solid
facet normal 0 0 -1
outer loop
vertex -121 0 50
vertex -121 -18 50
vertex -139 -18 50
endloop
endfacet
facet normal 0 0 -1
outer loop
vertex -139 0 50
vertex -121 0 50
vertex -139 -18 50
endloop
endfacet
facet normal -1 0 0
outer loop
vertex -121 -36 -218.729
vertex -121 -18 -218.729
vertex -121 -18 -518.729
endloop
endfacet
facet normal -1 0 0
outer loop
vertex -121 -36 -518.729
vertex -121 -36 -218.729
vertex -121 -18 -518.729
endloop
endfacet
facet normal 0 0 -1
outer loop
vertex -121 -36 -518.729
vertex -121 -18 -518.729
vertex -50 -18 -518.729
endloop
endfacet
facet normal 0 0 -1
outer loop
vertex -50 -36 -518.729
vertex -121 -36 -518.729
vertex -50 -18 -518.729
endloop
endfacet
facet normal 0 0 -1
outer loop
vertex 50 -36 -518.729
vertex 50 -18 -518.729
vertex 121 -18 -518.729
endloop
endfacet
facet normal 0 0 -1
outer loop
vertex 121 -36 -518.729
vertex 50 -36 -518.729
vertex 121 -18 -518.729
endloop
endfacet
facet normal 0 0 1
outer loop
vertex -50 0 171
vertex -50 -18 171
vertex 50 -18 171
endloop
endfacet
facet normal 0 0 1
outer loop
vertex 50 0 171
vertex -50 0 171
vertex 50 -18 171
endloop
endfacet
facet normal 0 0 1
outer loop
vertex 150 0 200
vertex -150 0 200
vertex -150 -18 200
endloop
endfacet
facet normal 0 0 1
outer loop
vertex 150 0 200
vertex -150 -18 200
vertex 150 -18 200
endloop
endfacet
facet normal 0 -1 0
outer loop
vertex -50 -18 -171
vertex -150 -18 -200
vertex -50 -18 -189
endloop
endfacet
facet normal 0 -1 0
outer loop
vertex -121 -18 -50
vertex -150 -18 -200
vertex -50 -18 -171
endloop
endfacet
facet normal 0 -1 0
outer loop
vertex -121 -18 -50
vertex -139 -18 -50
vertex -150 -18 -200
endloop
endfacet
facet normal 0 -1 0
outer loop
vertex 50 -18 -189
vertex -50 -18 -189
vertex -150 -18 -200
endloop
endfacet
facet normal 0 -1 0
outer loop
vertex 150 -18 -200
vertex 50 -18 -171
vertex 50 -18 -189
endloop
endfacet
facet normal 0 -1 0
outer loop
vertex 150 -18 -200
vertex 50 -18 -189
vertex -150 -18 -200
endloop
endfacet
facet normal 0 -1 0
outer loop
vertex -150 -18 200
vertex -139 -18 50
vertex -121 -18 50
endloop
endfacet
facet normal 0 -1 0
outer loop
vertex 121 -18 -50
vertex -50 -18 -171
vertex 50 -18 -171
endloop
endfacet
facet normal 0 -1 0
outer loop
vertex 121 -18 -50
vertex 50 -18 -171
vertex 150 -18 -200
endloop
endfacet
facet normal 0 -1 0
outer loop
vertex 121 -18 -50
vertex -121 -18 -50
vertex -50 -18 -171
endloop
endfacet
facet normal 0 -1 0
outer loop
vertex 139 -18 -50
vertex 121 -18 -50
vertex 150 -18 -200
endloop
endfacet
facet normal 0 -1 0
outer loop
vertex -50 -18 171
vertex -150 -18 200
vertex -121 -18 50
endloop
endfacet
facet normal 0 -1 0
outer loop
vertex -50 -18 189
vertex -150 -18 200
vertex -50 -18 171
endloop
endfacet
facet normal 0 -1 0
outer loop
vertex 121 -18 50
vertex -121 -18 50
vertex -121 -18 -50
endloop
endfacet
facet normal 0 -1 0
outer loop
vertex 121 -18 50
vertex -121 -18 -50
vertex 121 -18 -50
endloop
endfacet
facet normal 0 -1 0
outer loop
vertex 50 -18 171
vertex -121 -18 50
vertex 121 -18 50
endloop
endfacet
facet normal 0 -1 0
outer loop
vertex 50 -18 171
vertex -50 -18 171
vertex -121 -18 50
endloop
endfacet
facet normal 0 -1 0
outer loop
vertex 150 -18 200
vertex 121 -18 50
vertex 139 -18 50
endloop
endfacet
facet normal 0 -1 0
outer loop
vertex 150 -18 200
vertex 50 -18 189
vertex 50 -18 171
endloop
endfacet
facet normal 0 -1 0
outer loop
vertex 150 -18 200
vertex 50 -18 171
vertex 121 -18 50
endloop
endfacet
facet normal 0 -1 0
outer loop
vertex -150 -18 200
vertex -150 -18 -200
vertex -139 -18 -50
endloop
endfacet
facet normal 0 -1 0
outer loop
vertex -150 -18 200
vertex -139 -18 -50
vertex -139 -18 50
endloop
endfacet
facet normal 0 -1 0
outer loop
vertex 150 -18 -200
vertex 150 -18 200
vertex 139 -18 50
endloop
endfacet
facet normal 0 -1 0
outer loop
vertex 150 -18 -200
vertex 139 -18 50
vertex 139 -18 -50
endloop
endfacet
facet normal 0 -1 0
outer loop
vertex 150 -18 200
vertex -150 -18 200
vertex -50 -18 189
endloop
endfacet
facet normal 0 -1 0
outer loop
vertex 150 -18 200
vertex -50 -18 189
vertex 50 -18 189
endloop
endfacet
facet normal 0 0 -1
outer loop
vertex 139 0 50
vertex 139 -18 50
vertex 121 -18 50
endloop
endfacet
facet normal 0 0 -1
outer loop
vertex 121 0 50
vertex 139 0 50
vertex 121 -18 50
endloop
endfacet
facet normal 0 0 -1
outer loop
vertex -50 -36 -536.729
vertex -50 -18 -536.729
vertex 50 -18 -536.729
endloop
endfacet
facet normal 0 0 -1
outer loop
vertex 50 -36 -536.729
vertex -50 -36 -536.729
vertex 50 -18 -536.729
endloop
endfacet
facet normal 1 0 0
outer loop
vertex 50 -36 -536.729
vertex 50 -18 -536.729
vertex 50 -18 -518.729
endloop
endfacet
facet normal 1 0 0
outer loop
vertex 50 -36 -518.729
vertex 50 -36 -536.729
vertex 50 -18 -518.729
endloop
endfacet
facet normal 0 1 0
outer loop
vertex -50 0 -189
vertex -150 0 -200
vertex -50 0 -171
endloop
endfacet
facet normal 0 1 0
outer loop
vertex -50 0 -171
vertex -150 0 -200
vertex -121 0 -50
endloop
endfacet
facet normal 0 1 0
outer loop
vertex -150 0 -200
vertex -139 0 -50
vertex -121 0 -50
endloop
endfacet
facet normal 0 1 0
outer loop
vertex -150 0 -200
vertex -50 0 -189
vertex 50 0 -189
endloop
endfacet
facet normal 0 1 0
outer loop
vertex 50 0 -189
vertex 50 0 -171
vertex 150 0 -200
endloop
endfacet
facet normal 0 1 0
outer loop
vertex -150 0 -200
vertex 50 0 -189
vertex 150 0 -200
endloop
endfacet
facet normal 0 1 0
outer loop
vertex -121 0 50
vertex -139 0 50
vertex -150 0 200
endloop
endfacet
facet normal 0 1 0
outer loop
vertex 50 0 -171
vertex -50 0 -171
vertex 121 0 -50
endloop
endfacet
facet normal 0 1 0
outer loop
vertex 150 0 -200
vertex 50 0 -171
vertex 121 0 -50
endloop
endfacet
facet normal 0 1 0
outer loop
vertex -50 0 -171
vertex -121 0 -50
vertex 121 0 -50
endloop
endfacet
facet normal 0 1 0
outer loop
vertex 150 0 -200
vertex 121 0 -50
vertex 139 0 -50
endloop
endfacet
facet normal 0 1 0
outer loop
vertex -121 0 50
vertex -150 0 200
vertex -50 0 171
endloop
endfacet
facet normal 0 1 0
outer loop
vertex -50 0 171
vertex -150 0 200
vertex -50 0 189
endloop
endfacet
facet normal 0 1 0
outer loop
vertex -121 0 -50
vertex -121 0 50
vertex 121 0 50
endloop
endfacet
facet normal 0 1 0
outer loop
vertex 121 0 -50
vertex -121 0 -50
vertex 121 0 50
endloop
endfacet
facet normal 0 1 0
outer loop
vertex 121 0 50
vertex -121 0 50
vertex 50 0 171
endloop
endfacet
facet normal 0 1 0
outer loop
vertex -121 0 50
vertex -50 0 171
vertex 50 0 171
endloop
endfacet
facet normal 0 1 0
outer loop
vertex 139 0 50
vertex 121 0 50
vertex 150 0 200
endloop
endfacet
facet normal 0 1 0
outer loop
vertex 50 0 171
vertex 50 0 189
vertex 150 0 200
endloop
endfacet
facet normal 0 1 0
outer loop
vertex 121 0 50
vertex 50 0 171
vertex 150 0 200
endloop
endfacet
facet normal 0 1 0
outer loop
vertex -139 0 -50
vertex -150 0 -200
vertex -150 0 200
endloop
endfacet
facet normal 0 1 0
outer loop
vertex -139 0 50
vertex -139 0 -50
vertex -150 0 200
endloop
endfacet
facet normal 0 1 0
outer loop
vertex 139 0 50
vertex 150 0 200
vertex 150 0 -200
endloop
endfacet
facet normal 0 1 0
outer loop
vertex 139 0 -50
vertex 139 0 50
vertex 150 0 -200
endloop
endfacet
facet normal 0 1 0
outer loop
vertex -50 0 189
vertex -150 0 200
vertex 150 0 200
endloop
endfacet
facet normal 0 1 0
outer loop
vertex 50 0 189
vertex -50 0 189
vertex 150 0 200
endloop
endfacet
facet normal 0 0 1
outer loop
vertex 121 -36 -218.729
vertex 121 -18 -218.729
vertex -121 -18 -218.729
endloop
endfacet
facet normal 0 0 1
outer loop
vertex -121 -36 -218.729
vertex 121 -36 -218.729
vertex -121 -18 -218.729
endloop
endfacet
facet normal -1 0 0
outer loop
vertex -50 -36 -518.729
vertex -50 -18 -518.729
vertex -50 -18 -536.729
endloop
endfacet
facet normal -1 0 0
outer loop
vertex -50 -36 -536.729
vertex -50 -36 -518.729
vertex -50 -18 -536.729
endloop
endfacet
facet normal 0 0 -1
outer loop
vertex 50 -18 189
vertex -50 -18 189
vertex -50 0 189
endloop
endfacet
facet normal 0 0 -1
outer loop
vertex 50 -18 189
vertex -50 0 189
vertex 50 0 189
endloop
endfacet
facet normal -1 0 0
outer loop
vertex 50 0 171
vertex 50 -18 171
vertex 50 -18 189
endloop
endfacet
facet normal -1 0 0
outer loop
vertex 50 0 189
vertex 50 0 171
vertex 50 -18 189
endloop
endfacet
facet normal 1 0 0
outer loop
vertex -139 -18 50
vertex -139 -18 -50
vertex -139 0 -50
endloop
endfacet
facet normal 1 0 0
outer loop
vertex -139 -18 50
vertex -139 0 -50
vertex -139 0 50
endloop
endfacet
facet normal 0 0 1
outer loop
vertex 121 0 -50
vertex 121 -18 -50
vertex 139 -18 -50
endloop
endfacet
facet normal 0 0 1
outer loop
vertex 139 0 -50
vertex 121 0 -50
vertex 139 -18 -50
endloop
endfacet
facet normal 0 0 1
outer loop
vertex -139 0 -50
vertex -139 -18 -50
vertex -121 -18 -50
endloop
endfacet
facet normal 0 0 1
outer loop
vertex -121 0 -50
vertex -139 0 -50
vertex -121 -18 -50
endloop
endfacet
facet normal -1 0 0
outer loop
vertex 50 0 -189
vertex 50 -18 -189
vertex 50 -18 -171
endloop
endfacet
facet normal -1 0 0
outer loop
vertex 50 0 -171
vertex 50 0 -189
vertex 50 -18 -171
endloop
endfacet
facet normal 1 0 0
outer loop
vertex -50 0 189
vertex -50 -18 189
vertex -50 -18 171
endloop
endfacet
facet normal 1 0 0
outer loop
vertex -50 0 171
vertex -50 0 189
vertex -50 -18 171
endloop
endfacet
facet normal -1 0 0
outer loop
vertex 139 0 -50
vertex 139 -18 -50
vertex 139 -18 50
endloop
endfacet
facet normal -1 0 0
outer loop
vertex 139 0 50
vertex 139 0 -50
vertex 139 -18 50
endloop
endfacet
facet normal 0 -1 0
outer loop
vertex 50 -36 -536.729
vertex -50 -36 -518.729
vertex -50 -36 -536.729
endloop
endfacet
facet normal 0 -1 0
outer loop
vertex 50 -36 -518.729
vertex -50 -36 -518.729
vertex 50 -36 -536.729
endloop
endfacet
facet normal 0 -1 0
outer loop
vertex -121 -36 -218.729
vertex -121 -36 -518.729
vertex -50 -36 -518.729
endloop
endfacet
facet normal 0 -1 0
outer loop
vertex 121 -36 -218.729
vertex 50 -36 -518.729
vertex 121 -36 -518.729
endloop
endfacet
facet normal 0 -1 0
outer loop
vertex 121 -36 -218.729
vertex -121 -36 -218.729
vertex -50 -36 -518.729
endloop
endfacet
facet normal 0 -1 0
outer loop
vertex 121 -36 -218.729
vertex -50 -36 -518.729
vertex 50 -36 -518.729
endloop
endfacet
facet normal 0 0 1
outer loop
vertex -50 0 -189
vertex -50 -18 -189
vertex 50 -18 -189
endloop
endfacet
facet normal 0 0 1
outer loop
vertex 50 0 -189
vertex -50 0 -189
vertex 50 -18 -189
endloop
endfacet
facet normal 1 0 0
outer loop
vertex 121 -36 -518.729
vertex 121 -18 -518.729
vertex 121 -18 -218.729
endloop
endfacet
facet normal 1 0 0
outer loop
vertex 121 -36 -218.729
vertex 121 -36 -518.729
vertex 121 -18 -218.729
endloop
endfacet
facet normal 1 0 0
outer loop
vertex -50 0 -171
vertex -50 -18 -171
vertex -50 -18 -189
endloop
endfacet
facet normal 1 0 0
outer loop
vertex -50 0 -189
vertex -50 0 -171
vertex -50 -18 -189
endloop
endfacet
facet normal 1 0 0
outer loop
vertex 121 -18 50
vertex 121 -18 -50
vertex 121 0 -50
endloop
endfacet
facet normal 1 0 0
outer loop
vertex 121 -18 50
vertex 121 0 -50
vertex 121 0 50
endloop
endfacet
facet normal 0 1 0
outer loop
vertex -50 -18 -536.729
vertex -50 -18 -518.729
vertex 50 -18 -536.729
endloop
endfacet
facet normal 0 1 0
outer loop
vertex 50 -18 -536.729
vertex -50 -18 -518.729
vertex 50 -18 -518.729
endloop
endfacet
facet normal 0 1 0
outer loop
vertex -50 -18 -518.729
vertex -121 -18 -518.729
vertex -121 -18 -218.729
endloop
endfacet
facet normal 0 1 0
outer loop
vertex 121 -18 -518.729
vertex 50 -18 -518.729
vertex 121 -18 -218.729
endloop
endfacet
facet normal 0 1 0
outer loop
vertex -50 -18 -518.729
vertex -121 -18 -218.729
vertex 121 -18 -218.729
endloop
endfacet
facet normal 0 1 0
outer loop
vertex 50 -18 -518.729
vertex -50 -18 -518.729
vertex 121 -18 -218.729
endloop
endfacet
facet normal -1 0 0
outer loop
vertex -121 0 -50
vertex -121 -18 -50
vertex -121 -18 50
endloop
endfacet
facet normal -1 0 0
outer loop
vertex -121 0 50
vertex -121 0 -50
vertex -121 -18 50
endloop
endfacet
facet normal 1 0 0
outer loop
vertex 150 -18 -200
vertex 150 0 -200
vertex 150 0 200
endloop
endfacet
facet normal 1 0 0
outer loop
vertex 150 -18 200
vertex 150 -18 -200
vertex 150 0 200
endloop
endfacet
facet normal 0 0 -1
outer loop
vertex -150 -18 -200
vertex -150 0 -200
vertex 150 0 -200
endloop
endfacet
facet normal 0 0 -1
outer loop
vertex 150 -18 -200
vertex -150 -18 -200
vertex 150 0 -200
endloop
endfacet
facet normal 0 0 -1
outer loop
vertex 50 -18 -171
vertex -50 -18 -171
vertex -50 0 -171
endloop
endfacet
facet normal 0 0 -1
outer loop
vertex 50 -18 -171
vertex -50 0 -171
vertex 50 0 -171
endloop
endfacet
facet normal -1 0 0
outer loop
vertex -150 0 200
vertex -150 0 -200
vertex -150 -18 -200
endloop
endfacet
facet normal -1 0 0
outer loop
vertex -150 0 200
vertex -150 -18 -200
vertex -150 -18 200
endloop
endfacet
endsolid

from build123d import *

# Parameters (mm, degrees)
F0_W     = 300
F0_H     = 400
F1_DEPTH = 18
F2_W     = 100
F2_H     = 9
F2_W_2   = 9
F2_H_2   = 100
F3_DEPTH = 25
F5_DEPTH = 18


with BuildPart() as f1:
    # F0 (on Front) → F1 (new body)
    with BuildSketch(Plane.XZ):
        Rectangle(F0_W, F0_H)
    extrude(amount=F1_DEPTH)

    # F2 (on face) → F3 (cut)
    with BuildSketch(Plane.XZ.offset(18)):
        with Locations((0, -184.5)):
            Rectangle(F2_W, F2_H)
        with Locations((0, -175.5)):
            Rectangle(F2_W, F2_H)
        with Locations((0, 175.5)):
            Rectangle(F2_W, F2_H)
        with Locations((0, 184.5)):
            Rectangle(F2_W, F2_H)
        with Locations((125.5, 0)):
            Rectangle(F2_W_2, F2_H_2)
        with Locations((134.5, 0)):
            Rectangle(F2_W_2, F2_H_2)
        with Locations((-134.5, 0)):
            Rectangle(F2_W_2, F2_H_2)
        with Locations((-125.5, 0)):
            Rectangle(F2_W_2, F2_H_2)
    extrude(amount=-F3_DEPTH, mode=Mode.SUBTRACT)


with BuildPart() as f5:
    # F4 (on face) → F5 (new body)
    with BuildSketch(Plane.XZ.offset(18)):
        Polygon((121, -218.728602), (-121, -218.728602), (-121, -518.728602), (-50, -518.728602), (-50, -536.728602), (50, -536.728602), (50, -518.728602), (121, -518.728602), align=None)
    extrude(amount=F5_DEPTH)


solid = Compound([f1.part, f5.part])
